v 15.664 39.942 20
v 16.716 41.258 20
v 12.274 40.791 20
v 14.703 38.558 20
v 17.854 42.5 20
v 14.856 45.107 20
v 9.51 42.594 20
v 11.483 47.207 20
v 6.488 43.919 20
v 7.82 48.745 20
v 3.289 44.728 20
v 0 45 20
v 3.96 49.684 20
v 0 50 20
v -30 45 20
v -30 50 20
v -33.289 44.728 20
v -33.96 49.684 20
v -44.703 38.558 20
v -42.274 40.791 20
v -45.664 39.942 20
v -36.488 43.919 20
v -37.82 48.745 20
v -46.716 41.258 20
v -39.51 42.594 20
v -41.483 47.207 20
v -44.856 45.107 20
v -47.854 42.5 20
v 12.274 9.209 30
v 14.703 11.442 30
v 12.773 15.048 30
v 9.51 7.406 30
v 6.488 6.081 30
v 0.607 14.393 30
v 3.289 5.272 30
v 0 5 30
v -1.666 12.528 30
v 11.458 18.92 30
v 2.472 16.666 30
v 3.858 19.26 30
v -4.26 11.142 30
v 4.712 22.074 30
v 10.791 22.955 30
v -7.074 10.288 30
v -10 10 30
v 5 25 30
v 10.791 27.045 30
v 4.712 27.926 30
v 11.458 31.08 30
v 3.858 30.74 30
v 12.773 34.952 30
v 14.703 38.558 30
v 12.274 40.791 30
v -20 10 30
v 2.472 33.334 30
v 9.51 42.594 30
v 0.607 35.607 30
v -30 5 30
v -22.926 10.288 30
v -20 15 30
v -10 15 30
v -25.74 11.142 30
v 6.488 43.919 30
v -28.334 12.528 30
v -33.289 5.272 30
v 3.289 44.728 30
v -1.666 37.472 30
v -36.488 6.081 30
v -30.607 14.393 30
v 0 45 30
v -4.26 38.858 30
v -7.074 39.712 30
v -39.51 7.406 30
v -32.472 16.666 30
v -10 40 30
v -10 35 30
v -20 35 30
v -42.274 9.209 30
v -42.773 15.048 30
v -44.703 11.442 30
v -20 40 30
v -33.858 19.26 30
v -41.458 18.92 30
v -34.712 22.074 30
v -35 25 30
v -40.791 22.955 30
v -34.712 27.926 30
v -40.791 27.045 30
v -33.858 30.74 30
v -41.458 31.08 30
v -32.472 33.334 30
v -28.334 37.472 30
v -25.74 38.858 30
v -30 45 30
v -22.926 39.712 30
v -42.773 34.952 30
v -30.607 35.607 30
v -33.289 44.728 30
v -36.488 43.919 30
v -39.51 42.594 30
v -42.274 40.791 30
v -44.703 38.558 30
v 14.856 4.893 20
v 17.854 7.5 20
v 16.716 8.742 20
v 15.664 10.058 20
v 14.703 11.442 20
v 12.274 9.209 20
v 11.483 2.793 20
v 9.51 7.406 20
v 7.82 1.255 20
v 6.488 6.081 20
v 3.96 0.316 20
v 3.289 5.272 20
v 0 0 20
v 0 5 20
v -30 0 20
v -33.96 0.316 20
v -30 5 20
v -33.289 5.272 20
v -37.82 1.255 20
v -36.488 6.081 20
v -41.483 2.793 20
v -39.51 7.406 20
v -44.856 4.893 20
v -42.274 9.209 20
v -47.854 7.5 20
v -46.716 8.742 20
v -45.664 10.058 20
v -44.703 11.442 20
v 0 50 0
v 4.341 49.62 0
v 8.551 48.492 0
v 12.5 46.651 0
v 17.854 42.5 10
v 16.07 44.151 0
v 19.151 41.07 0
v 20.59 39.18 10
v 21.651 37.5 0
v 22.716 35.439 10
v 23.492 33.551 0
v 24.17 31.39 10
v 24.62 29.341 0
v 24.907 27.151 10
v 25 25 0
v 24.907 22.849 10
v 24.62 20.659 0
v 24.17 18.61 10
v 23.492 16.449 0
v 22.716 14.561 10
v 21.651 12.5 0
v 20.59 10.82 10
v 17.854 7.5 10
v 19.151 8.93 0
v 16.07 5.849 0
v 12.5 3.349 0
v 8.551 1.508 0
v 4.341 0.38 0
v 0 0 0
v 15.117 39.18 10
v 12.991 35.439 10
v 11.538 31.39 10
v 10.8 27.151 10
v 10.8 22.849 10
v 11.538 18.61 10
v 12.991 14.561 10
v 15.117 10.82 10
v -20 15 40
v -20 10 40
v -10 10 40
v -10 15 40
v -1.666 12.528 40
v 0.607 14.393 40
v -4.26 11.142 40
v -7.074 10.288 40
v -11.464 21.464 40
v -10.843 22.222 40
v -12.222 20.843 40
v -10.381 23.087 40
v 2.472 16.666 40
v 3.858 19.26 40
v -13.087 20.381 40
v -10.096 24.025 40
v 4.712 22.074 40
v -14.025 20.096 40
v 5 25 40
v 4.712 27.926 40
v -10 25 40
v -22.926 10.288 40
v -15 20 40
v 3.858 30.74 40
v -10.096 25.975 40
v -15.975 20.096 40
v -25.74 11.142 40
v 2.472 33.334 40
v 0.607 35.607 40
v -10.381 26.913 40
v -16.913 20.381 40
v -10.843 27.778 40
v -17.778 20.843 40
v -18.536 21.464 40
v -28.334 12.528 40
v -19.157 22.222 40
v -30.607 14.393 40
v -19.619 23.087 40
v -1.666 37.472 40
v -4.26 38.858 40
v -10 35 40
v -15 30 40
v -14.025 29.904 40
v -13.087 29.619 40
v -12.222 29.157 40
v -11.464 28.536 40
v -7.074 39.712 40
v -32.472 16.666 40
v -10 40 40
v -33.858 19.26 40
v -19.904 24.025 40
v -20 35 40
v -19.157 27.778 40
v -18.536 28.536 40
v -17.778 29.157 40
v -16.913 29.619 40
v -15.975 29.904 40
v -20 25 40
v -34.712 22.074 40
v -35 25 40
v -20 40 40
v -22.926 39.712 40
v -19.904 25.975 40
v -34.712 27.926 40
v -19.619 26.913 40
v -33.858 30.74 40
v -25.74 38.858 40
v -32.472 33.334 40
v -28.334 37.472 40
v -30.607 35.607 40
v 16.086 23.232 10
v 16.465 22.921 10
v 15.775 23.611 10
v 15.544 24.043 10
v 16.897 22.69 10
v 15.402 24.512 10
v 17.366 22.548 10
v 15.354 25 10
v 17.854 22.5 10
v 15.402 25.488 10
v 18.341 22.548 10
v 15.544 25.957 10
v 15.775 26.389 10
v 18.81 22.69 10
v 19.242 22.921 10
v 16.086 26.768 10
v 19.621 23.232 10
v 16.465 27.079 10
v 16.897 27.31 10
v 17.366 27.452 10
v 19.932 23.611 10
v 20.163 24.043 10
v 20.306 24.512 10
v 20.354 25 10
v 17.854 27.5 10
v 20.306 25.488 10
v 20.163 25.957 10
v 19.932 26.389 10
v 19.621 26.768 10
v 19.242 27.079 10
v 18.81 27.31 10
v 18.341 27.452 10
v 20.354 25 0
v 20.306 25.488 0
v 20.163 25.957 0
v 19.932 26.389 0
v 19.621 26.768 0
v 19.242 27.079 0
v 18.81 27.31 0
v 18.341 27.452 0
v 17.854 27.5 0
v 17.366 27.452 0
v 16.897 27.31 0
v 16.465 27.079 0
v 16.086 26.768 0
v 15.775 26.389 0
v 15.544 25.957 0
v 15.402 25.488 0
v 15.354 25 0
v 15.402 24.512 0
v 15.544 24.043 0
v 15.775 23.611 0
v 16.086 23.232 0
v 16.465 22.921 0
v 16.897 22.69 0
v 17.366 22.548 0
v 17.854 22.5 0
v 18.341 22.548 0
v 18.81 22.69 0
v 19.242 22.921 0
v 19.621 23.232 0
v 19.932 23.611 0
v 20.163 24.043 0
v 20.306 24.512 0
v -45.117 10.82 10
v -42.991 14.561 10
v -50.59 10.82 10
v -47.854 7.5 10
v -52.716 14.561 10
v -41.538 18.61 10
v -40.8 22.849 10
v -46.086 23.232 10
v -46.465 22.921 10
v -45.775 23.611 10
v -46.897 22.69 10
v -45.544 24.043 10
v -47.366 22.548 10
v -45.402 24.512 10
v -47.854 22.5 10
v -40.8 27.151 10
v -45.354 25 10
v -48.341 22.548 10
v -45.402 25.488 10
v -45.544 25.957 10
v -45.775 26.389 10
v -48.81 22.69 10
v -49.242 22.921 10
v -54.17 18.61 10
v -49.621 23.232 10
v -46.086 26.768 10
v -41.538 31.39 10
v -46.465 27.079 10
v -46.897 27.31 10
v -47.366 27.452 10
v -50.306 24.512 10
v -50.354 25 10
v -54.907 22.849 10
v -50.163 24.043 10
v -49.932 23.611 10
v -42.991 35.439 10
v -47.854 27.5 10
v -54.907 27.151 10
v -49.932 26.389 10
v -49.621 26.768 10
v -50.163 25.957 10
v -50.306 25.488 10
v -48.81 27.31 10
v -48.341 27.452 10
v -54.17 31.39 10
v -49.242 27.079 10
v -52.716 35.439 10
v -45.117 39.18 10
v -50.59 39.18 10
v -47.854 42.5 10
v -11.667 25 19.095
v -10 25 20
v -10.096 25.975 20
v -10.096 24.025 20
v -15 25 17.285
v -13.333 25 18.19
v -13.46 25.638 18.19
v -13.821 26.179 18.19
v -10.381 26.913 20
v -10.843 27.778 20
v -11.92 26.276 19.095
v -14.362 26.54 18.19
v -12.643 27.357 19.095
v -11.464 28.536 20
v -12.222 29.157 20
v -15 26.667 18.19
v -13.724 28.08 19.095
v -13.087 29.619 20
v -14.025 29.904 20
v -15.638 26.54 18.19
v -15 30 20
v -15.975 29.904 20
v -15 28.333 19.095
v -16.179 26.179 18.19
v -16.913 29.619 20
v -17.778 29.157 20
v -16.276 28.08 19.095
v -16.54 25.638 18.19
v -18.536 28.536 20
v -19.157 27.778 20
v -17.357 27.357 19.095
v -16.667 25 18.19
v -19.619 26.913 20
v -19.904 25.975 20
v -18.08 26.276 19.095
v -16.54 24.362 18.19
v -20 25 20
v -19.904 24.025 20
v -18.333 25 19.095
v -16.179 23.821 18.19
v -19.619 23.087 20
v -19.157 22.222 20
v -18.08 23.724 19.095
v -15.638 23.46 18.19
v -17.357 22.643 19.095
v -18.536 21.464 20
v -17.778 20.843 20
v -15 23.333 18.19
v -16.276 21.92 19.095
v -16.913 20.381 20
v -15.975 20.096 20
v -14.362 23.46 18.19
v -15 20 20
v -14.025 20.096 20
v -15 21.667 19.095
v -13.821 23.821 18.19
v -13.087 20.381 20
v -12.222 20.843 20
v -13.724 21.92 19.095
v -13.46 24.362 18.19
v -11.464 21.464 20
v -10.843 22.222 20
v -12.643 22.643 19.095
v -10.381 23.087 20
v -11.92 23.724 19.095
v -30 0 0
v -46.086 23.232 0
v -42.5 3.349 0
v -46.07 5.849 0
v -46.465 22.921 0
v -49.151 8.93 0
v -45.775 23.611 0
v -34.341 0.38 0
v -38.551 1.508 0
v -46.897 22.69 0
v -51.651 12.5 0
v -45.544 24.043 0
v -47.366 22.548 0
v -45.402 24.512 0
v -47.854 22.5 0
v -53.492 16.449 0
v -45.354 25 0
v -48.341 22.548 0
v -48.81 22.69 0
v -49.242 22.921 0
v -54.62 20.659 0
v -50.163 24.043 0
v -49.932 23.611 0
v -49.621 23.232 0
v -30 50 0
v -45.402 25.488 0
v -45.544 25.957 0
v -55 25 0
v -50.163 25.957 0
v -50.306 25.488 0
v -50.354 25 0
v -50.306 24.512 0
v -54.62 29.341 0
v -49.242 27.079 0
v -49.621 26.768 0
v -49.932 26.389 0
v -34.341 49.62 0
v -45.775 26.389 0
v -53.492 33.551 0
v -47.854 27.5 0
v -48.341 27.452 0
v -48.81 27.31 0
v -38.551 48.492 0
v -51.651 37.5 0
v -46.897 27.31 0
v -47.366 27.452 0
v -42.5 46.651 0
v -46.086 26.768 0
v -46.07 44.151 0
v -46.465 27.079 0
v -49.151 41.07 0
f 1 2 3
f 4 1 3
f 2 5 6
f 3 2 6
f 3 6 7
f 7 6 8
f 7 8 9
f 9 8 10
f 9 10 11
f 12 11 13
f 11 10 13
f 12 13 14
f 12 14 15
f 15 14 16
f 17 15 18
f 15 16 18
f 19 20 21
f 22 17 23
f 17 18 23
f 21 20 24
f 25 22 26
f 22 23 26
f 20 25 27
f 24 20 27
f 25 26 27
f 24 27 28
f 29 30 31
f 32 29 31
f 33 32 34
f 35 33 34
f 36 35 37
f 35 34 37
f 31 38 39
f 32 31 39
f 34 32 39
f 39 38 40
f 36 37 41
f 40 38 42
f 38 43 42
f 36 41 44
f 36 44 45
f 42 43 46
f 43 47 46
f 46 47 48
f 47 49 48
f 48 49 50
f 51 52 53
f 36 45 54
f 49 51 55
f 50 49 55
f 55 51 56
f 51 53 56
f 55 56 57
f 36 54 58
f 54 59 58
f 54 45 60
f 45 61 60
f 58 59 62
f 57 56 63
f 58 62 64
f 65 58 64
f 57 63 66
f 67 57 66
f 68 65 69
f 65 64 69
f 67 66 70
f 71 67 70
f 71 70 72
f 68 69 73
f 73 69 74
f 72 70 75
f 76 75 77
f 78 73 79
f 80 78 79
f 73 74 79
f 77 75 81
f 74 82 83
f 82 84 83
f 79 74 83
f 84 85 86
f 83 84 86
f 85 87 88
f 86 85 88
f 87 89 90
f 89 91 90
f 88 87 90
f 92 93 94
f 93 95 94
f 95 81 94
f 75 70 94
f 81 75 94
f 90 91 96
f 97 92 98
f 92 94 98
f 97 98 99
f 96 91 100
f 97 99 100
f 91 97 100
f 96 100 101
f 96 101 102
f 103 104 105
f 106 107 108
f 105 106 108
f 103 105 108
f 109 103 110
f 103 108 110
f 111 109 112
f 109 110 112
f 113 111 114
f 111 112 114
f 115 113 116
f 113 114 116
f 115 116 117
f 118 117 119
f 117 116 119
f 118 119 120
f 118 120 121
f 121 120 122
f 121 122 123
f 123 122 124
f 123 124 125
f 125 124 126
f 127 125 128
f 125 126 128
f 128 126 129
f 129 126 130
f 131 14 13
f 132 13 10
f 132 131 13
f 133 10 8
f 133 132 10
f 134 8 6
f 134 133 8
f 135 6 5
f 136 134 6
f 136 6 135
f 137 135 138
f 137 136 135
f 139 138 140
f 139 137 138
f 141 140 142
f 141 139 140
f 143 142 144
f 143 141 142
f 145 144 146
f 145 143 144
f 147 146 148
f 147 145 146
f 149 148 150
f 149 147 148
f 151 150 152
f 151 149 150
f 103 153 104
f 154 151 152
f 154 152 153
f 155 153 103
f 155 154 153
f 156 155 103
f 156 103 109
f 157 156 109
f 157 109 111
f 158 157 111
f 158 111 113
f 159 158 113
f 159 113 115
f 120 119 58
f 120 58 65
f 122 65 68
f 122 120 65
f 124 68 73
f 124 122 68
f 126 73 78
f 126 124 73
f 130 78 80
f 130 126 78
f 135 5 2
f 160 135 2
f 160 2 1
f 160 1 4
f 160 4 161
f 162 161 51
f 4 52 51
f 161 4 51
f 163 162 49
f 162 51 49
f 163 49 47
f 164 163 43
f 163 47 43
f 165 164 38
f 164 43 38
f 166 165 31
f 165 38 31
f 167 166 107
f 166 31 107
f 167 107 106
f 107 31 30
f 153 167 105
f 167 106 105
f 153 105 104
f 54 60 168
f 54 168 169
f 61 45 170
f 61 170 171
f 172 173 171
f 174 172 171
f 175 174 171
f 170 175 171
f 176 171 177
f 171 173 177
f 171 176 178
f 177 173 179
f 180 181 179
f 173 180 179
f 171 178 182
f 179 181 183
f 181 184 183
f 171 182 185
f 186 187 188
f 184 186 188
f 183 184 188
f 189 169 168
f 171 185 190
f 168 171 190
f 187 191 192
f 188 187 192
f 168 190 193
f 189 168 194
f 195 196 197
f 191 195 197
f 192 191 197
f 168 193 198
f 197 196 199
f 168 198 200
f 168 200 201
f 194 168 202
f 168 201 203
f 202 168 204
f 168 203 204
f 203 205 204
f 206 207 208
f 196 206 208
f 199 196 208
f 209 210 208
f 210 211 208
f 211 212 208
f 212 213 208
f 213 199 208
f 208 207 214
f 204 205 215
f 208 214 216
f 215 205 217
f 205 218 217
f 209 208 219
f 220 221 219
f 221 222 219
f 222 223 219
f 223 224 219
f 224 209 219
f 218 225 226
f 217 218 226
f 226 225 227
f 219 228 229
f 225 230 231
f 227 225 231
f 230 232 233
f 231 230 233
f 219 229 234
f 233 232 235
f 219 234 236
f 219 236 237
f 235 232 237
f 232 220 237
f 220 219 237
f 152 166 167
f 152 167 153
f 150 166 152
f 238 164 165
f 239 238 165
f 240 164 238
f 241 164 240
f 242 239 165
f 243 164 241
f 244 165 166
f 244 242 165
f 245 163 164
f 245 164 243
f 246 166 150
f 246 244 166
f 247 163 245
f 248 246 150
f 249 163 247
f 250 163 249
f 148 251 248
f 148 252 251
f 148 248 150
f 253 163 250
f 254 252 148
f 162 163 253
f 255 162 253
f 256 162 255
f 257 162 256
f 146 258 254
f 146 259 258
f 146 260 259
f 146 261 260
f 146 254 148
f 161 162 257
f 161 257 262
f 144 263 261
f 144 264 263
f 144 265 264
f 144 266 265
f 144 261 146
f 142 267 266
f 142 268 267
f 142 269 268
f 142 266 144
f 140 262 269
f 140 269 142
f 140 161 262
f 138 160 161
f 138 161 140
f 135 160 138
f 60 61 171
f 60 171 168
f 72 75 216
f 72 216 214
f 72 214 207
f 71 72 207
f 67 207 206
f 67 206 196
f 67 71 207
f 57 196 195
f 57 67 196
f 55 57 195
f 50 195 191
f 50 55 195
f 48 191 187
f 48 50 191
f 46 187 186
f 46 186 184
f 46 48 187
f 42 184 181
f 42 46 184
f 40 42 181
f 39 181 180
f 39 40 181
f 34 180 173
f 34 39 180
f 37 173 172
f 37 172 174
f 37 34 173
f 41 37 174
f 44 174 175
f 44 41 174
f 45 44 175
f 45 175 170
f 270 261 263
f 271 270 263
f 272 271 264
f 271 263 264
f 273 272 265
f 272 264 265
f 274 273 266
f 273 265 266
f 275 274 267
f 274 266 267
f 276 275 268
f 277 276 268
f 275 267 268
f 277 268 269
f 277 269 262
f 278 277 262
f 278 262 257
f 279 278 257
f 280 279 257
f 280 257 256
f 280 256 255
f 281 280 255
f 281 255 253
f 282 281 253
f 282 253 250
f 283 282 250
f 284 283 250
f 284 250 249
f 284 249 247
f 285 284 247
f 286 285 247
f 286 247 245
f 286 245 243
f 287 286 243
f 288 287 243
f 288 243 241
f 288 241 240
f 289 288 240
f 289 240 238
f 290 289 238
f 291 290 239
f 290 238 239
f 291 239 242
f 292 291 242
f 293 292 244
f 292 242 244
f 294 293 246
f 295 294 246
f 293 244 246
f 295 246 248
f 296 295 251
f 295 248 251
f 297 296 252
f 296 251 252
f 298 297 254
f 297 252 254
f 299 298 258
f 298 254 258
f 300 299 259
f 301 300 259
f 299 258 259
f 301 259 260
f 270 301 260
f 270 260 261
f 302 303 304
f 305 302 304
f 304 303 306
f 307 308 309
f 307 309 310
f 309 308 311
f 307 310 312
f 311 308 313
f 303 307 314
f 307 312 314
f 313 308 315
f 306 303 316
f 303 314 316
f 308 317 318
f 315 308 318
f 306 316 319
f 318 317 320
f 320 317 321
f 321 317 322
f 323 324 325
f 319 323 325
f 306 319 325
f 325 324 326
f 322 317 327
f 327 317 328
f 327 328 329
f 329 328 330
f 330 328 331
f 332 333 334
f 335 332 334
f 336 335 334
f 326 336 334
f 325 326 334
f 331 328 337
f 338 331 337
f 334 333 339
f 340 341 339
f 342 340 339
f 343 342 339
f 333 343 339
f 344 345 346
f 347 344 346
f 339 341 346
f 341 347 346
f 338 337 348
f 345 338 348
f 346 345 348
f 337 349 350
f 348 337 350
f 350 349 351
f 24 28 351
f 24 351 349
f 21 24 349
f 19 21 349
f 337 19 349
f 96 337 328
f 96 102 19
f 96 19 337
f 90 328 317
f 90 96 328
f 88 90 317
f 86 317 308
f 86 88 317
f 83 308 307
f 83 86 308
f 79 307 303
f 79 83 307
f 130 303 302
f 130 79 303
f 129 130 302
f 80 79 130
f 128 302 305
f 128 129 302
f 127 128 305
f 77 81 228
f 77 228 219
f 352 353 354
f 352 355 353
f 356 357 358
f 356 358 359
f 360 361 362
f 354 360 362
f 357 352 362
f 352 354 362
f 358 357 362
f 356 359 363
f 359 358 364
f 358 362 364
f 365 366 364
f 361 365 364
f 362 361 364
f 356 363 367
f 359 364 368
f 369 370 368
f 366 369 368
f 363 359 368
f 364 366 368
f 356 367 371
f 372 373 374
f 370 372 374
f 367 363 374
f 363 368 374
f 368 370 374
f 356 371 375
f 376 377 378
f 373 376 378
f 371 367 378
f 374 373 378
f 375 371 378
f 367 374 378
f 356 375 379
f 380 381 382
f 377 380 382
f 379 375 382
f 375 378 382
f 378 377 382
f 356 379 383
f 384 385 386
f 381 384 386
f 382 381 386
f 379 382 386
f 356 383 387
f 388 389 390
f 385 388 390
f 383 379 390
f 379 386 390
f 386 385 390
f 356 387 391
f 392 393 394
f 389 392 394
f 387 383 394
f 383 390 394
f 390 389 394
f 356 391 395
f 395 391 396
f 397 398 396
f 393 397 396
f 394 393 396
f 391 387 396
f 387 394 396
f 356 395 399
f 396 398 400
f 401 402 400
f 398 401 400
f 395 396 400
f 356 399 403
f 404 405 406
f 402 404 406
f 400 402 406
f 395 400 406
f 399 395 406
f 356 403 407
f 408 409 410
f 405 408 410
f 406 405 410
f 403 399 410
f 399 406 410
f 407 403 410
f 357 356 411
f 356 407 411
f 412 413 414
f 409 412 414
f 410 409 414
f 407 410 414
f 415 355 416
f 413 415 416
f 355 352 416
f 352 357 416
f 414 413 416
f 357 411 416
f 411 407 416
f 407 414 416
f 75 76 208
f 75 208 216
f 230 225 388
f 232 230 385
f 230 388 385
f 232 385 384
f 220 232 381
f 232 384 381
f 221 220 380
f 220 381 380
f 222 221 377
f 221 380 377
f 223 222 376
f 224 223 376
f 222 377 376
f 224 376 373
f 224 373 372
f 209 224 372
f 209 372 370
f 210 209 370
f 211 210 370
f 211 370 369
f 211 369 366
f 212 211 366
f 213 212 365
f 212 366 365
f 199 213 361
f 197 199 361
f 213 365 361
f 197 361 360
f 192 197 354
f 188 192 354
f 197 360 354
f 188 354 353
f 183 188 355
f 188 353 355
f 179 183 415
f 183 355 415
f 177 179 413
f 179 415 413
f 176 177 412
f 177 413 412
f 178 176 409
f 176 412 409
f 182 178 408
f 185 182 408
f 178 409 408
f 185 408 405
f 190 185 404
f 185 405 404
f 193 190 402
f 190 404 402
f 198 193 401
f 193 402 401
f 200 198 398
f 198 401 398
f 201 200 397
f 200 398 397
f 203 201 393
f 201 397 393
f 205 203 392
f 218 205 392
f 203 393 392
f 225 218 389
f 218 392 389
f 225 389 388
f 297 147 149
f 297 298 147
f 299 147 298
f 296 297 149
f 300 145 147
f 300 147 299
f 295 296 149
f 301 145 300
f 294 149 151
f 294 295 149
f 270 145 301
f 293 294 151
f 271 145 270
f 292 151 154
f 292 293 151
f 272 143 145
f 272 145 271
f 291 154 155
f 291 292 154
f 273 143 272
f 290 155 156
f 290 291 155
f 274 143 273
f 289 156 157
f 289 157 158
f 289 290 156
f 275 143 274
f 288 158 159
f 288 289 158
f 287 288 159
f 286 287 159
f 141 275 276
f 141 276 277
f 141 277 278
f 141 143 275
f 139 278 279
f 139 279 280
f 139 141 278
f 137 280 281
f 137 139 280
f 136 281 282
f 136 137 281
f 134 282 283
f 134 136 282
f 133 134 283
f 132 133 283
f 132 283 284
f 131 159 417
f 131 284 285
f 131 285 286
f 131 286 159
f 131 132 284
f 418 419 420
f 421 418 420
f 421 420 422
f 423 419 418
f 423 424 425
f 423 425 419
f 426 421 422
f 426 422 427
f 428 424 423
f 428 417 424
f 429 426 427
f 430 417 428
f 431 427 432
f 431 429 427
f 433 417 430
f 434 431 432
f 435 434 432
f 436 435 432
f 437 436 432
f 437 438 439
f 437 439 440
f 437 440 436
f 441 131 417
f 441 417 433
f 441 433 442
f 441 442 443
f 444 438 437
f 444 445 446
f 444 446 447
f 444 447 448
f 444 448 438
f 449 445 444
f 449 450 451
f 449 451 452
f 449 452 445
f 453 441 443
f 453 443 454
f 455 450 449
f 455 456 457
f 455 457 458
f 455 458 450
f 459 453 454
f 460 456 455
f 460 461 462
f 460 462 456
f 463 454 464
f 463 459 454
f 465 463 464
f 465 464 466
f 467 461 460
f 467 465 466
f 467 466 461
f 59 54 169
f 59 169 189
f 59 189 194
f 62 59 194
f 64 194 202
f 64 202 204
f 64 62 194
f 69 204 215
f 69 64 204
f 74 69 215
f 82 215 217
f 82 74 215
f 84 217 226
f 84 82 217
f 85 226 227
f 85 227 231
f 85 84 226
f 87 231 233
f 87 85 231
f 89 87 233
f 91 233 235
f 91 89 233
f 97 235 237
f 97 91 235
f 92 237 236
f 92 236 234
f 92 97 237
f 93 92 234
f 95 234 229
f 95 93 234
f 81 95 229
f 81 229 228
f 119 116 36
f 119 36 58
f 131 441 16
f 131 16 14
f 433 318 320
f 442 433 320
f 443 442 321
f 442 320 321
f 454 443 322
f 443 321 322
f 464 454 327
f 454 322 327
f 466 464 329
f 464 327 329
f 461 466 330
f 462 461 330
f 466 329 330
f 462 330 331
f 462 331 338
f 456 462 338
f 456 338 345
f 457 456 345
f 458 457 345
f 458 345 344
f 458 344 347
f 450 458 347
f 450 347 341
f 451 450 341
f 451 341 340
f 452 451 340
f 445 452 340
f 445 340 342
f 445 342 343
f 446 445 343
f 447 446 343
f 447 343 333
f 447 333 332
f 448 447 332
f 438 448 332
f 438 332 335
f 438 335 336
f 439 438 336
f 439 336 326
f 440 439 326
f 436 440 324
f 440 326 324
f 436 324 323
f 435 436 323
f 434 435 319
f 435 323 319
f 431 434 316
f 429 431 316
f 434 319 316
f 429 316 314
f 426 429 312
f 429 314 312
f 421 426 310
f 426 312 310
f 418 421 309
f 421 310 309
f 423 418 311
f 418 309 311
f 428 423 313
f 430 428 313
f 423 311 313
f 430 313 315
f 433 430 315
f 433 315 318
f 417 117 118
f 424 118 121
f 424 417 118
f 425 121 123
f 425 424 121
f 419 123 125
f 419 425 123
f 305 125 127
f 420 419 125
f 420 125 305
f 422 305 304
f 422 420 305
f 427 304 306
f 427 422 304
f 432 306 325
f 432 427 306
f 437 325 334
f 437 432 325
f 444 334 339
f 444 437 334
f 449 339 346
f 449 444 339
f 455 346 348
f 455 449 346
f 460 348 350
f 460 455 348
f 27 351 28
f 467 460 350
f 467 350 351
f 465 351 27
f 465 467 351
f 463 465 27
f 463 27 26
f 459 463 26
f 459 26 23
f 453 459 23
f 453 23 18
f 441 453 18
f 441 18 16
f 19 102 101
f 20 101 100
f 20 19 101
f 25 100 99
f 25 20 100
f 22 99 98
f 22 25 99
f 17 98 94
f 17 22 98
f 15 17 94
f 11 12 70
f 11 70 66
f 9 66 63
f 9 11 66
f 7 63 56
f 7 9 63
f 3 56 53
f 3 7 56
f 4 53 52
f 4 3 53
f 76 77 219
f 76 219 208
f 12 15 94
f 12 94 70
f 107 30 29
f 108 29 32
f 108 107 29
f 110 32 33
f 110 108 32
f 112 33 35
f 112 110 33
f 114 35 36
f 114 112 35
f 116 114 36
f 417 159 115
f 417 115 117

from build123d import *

# Parameters (mm, degrees)
BOSS_EXTRUDE1_DEPTH            = 20
CUT_EXTRUDE10_DEPTH            = 10
CUT_EXTRUDE11_DEPTH            = 10
BOSS_EXTRUDE4_DEPTH            = 10
CUT_EXTRUDE16_DEPTH            = 20
BOSS_EXTRUDE6_DEPTH            = 10
SKETCH15_R                     = 2.5
CUT_EXTRUDE17_DEPTH            = 33
F_1_2_1_2_DIAMETER_HOLE2_D     = 10
F_1_2_1_2_DIAMETER_HOLE2_DEPTH = 20
F_1_2_1_2_DIAMETER_HOLE2_TIP   = 2.714778498


with BuildPart() as part:
    # Sketch1 → Boss-Extrude1 (new body)
    with BuildSketch(Plane.XY):
        with BuildLine():
            Line((-30, 50), (0, 50))
            ThreePointArc((0, 50), (25, 25), (0, 0))
            Line((0, 0), (-30, 0))
            ThreePointArc((-30, 0), (-55, 25), (-30, 50))
        make_face()
    extrude(amount=BOSS_EXTRUDE1_DEPTH)

    # Sketch2 → Cut-Extrude10 (cut)
    with BuildSketch(Plane.XY.offset(20)):
        with BuildLine():
            ThreePointArc((-47.853571071, 42.5), (-55, 25), (-47.853571071, 7.5))
            Line((-47.853571071, 7.5), (-47.853571071, 42.5))
        make_face()
    extrude(amount=-CUT_EXTRUDE10_DEPTH, mode=Mode.SUBTRACT)

    # Sketch9 → Cut-Extrude11 (cut)
    with BuildSketch(Plane.XY.offset(20)):
        with BuildLine():
            Line((17.853571071, 42.5), (17.853571071, 7.5))
            ThreePointArc((17.853571071, 7.5), (25, 25), (17.853571071, 42.5))
        make_face()
    extrude(amount=-CUT_EXTRUDE11_DEPTH, mode=Mode.SUBTRACT)

    # Sketch10 → Boss-Extrude4 (add)
    with BuildSketch(Plane.XY.offset(20)):
        with BuildLine():
            Line((-30, 45), (0, 45))
            ThreePointArc((0, 45), (20, 25), (0, 5))
            Line((0, 5), (-30, 5))
            ThreePointArc((-30, 5), (-50, 25), (-30, 45))
        make_face()
    extrude(amount=BOSS_EXTRUDE4_DEPTH)

    # Sketch11 → Cut-Extrude16 (cut)
    with BuildSketch(Plane.XY.offset(30)):
        with BuildLine():
            ThreePointArc((-47.853571071, 42.5), (-40.707142143, 25), (-47.853571071, 7.5))
            ThreePointArc((-47.853571071, 7.5), (-55, 25), (-47.853571071, 42.5))
        make_face()
        with BuildLine():
            ThreePointArc((17.853571071, 42.5), (10.707142143, 25), (17.853571071, 7.5))
            ThreePointArc((17.853571071, 7.5), (25, 25), (17.853571071, 42.5))
        make_face()
    extrude(amount=-CUT_EXTRUDE16_DEPTH, mode=Mode.SUBTRACT)

    # Sketch14 → Boss-Extrude6 (add)
    with BuildSketch(Plane.XY.offset(30)):
        with BuildLine():
            Line((-20, 40), (-20, 35))
            Line((-20, 35), (-10, 35))
            Line((-10, 35), (-10, 40))
            ThreePointArc((-10, 40), (5, 25), (-10, 10))
            Line((-10, 10), (-10, 15))
            Line((-10, 15), (-20, 15))
            Line((-20, 15), (-20, 10))
            ThreePointArc((-20, 10), (-35, 25), (-20, 40))
        make_face()
    extrude(amount=BOSS_EXTRUDE6_DEPTH)

    # Sketch15 → Cut-Extrude17 (cut)
    with BuildSketch(Plane.XY.offset(10)):
        with Locations((17.853571071, 25)):
            Circle(SKETCH15_R)
        with Locations((-47.853571071, 25)):
            Circle(SKETCH15_R)
    extrude(amount=-CUT_EXTRUDE17_DEPTH, mode=Mode.SUBTRACT)

    # Ø1.2 (1.2) Diameter Hole2
    with Locations(Plane(origin=(-15, 25, 40), x_dir=(1, 0, 0), z_dir=(0, 0, 1))):
        with Locations((0, 0)):
            Hole(F_1_2_1_2_DIAMETER_HOLE2_D / 2, depth=F_1_2_1_2_DIAMETER_HOLE2_DEPTH)
            with Locations((0, 0, -(F_1_2_1_2_DIAMETER_HOLE2_DEPTH + F_1_2_1_2_DIAMETER_HOLE2_TIP / 2))):  # 123° drill point
                Cone(0, F_1_2_1_2_DIAMETER_HOLE2_D / 2, F_1_2_1_2_DIAMETER_HOLE2_TIP, mode=Mode.SUBTRACT)


solid = part.part
